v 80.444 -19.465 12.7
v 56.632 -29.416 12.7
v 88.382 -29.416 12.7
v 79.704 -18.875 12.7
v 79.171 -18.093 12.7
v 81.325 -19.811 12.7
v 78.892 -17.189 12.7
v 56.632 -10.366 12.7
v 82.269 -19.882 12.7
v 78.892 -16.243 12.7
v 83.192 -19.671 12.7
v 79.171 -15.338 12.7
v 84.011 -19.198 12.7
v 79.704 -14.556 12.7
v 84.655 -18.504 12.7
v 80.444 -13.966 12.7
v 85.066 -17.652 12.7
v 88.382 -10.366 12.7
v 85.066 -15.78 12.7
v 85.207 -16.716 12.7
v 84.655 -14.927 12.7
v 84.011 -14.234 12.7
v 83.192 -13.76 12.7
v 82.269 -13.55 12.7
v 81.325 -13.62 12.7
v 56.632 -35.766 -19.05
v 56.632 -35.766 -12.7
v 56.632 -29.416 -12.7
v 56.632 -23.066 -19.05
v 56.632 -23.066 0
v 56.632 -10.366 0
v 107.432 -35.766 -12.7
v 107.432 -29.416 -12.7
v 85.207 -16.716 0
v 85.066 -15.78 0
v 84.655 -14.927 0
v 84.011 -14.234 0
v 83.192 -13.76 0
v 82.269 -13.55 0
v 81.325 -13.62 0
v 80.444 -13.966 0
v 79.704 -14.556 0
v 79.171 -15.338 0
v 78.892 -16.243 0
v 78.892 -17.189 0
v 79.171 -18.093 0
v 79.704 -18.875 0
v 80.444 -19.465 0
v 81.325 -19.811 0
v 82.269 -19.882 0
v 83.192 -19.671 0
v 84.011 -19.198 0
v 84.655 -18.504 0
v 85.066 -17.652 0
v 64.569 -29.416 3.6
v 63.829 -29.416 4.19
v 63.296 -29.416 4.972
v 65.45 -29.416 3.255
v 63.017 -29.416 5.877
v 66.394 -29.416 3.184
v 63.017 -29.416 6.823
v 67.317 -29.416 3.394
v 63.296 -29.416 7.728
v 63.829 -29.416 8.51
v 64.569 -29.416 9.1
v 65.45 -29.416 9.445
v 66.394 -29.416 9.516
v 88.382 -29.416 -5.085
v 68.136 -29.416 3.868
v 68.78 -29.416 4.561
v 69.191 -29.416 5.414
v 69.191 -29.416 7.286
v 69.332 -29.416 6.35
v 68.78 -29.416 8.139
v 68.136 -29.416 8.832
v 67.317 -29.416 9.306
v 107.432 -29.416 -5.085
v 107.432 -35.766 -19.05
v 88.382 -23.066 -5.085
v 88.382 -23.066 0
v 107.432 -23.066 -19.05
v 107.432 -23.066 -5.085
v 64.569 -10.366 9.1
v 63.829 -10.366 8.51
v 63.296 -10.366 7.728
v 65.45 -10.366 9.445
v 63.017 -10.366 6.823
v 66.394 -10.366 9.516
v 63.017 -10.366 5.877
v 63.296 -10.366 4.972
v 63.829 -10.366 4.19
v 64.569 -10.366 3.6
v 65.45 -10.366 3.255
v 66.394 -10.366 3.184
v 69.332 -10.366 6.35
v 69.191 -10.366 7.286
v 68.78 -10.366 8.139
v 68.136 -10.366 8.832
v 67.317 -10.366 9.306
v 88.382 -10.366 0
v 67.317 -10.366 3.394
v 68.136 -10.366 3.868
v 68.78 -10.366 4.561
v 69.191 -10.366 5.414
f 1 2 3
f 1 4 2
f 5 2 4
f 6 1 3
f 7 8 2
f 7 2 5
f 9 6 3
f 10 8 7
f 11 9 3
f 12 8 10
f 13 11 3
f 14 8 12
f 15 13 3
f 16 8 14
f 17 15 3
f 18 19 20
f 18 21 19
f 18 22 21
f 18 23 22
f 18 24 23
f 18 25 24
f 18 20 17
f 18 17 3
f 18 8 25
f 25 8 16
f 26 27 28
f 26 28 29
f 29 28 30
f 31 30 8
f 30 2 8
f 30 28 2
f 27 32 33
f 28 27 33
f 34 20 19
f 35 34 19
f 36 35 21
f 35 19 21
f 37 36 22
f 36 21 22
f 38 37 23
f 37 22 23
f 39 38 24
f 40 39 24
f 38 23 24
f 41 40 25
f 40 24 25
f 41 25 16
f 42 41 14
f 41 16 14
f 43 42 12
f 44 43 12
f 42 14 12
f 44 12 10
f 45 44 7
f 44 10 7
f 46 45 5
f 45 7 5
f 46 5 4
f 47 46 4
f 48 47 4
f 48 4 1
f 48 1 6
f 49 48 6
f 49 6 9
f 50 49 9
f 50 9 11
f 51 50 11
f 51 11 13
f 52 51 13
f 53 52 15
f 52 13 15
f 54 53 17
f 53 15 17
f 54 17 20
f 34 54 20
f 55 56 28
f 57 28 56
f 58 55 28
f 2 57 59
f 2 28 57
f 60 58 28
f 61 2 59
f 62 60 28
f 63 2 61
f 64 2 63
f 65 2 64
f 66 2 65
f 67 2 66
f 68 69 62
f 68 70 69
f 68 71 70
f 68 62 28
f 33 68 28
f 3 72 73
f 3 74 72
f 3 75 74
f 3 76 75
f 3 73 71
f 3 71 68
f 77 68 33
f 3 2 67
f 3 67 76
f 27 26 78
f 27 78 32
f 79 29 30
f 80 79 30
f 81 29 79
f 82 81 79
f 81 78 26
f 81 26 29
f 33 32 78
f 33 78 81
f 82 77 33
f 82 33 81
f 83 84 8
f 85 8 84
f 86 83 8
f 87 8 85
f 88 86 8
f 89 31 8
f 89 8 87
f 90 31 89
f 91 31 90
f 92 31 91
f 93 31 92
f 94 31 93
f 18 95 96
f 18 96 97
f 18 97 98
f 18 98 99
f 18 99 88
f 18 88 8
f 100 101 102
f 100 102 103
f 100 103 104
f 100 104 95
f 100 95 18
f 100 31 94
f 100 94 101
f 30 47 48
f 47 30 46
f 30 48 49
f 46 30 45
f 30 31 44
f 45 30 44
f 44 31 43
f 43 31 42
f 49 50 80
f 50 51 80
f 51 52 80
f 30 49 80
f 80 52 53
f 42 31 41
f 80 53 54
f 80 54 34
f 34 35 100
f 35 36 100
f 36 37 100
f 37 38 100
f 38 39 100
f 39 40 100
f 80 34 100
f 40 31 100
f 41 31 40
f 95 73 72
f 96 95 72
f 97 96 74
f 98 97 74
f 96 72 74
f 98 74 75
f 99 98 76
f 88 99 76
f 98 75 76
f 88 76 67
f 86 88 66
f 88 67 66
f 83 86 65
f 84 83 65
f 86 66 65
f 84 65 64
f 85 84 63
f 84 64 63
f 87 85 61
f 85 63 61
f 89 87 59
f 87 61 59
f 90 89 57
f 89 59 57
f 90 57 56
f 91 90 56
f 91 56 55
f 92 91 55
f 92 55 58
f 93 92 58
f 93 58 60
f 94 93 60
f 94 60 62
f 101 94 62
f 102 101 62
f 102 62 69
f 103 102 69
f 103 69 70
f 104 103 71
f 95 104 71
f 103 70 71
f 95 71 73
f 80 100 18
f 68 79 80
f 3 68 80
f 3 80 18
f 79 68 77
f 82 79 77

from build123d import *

# Parameters (mm, degrees)
F0_W      = 31.75
F0_H      = 19.05
F1_DEPTH  = 12.7
F2_W      = 50.8
F2_H      = 12.7
F3_DEPTH  = 6.35
F4_W      = 19.05
F4_H      = 5.085397
F5_DEPTH  = 6.35
F6_W      = 12.7
F6_H      = 6.35
F7_DEPTH  = 50.8
F9_R      = 3.175
F10_DEPTH = 12.7
F8_R      = 3.175
F11_DEPTH = 19.05


with BuildPart() as f1:
    # F0 (on Top) → F1 (new body)
    with BuildSketch(Plane.XY):
        with Locations((72.506752, -19.890864)):
            Rectangle(F0_W, F0_H)
    extrude(amount=F1_DEPTH)

    # F2 (on face) → F3 (join)
    with BuildSketch(Plane.XZ.offset(29.415864)):
        with Locations((82.031752, -6.35)):
            Rectangle(F2_W, F2_H)
    extrude(amount=-F3_DEPTH)

    # F4 (on face) → F5 (cut)
    with BuildSketch(Plane.XZ.offset(29.415864)):
        with Locations((97.906752, -2.542698)):
            Rectangle(F4_W, F4_H)
    extrude(amount=-F5_DEPTH, mode=Mode.SUBTRACT)

    # F6 (on face) → F7 (join)
    with BuildSketch(Plane.YZ.offset(107.431752)):
        with Locations((-29.415864, -15.875)):
            Rectangle(F6_W, F6_H)
    extrude(amount=-F7_DEPTH)

    # F9 (on face) → F10 (cut)
    with BuildSketch(Plane.XY.offset(12.7)):
        with Locations((82.031752, -16.715864)):
            Circle(F9_R)
    extrude(amount=-F10_DEPTH, mode=Mode.SUBTRACT)

    # F8 (on face) → F11 (cut)
    with BuildSketch(Plane.XZ.offset(29.415864)):
        with Locations((66.156752, 6.35)):
            Circle(F8_R)
    extrude(amount=-F11_DEPTH, mode=Mode.SUBTRACT)


solid = f1.part
